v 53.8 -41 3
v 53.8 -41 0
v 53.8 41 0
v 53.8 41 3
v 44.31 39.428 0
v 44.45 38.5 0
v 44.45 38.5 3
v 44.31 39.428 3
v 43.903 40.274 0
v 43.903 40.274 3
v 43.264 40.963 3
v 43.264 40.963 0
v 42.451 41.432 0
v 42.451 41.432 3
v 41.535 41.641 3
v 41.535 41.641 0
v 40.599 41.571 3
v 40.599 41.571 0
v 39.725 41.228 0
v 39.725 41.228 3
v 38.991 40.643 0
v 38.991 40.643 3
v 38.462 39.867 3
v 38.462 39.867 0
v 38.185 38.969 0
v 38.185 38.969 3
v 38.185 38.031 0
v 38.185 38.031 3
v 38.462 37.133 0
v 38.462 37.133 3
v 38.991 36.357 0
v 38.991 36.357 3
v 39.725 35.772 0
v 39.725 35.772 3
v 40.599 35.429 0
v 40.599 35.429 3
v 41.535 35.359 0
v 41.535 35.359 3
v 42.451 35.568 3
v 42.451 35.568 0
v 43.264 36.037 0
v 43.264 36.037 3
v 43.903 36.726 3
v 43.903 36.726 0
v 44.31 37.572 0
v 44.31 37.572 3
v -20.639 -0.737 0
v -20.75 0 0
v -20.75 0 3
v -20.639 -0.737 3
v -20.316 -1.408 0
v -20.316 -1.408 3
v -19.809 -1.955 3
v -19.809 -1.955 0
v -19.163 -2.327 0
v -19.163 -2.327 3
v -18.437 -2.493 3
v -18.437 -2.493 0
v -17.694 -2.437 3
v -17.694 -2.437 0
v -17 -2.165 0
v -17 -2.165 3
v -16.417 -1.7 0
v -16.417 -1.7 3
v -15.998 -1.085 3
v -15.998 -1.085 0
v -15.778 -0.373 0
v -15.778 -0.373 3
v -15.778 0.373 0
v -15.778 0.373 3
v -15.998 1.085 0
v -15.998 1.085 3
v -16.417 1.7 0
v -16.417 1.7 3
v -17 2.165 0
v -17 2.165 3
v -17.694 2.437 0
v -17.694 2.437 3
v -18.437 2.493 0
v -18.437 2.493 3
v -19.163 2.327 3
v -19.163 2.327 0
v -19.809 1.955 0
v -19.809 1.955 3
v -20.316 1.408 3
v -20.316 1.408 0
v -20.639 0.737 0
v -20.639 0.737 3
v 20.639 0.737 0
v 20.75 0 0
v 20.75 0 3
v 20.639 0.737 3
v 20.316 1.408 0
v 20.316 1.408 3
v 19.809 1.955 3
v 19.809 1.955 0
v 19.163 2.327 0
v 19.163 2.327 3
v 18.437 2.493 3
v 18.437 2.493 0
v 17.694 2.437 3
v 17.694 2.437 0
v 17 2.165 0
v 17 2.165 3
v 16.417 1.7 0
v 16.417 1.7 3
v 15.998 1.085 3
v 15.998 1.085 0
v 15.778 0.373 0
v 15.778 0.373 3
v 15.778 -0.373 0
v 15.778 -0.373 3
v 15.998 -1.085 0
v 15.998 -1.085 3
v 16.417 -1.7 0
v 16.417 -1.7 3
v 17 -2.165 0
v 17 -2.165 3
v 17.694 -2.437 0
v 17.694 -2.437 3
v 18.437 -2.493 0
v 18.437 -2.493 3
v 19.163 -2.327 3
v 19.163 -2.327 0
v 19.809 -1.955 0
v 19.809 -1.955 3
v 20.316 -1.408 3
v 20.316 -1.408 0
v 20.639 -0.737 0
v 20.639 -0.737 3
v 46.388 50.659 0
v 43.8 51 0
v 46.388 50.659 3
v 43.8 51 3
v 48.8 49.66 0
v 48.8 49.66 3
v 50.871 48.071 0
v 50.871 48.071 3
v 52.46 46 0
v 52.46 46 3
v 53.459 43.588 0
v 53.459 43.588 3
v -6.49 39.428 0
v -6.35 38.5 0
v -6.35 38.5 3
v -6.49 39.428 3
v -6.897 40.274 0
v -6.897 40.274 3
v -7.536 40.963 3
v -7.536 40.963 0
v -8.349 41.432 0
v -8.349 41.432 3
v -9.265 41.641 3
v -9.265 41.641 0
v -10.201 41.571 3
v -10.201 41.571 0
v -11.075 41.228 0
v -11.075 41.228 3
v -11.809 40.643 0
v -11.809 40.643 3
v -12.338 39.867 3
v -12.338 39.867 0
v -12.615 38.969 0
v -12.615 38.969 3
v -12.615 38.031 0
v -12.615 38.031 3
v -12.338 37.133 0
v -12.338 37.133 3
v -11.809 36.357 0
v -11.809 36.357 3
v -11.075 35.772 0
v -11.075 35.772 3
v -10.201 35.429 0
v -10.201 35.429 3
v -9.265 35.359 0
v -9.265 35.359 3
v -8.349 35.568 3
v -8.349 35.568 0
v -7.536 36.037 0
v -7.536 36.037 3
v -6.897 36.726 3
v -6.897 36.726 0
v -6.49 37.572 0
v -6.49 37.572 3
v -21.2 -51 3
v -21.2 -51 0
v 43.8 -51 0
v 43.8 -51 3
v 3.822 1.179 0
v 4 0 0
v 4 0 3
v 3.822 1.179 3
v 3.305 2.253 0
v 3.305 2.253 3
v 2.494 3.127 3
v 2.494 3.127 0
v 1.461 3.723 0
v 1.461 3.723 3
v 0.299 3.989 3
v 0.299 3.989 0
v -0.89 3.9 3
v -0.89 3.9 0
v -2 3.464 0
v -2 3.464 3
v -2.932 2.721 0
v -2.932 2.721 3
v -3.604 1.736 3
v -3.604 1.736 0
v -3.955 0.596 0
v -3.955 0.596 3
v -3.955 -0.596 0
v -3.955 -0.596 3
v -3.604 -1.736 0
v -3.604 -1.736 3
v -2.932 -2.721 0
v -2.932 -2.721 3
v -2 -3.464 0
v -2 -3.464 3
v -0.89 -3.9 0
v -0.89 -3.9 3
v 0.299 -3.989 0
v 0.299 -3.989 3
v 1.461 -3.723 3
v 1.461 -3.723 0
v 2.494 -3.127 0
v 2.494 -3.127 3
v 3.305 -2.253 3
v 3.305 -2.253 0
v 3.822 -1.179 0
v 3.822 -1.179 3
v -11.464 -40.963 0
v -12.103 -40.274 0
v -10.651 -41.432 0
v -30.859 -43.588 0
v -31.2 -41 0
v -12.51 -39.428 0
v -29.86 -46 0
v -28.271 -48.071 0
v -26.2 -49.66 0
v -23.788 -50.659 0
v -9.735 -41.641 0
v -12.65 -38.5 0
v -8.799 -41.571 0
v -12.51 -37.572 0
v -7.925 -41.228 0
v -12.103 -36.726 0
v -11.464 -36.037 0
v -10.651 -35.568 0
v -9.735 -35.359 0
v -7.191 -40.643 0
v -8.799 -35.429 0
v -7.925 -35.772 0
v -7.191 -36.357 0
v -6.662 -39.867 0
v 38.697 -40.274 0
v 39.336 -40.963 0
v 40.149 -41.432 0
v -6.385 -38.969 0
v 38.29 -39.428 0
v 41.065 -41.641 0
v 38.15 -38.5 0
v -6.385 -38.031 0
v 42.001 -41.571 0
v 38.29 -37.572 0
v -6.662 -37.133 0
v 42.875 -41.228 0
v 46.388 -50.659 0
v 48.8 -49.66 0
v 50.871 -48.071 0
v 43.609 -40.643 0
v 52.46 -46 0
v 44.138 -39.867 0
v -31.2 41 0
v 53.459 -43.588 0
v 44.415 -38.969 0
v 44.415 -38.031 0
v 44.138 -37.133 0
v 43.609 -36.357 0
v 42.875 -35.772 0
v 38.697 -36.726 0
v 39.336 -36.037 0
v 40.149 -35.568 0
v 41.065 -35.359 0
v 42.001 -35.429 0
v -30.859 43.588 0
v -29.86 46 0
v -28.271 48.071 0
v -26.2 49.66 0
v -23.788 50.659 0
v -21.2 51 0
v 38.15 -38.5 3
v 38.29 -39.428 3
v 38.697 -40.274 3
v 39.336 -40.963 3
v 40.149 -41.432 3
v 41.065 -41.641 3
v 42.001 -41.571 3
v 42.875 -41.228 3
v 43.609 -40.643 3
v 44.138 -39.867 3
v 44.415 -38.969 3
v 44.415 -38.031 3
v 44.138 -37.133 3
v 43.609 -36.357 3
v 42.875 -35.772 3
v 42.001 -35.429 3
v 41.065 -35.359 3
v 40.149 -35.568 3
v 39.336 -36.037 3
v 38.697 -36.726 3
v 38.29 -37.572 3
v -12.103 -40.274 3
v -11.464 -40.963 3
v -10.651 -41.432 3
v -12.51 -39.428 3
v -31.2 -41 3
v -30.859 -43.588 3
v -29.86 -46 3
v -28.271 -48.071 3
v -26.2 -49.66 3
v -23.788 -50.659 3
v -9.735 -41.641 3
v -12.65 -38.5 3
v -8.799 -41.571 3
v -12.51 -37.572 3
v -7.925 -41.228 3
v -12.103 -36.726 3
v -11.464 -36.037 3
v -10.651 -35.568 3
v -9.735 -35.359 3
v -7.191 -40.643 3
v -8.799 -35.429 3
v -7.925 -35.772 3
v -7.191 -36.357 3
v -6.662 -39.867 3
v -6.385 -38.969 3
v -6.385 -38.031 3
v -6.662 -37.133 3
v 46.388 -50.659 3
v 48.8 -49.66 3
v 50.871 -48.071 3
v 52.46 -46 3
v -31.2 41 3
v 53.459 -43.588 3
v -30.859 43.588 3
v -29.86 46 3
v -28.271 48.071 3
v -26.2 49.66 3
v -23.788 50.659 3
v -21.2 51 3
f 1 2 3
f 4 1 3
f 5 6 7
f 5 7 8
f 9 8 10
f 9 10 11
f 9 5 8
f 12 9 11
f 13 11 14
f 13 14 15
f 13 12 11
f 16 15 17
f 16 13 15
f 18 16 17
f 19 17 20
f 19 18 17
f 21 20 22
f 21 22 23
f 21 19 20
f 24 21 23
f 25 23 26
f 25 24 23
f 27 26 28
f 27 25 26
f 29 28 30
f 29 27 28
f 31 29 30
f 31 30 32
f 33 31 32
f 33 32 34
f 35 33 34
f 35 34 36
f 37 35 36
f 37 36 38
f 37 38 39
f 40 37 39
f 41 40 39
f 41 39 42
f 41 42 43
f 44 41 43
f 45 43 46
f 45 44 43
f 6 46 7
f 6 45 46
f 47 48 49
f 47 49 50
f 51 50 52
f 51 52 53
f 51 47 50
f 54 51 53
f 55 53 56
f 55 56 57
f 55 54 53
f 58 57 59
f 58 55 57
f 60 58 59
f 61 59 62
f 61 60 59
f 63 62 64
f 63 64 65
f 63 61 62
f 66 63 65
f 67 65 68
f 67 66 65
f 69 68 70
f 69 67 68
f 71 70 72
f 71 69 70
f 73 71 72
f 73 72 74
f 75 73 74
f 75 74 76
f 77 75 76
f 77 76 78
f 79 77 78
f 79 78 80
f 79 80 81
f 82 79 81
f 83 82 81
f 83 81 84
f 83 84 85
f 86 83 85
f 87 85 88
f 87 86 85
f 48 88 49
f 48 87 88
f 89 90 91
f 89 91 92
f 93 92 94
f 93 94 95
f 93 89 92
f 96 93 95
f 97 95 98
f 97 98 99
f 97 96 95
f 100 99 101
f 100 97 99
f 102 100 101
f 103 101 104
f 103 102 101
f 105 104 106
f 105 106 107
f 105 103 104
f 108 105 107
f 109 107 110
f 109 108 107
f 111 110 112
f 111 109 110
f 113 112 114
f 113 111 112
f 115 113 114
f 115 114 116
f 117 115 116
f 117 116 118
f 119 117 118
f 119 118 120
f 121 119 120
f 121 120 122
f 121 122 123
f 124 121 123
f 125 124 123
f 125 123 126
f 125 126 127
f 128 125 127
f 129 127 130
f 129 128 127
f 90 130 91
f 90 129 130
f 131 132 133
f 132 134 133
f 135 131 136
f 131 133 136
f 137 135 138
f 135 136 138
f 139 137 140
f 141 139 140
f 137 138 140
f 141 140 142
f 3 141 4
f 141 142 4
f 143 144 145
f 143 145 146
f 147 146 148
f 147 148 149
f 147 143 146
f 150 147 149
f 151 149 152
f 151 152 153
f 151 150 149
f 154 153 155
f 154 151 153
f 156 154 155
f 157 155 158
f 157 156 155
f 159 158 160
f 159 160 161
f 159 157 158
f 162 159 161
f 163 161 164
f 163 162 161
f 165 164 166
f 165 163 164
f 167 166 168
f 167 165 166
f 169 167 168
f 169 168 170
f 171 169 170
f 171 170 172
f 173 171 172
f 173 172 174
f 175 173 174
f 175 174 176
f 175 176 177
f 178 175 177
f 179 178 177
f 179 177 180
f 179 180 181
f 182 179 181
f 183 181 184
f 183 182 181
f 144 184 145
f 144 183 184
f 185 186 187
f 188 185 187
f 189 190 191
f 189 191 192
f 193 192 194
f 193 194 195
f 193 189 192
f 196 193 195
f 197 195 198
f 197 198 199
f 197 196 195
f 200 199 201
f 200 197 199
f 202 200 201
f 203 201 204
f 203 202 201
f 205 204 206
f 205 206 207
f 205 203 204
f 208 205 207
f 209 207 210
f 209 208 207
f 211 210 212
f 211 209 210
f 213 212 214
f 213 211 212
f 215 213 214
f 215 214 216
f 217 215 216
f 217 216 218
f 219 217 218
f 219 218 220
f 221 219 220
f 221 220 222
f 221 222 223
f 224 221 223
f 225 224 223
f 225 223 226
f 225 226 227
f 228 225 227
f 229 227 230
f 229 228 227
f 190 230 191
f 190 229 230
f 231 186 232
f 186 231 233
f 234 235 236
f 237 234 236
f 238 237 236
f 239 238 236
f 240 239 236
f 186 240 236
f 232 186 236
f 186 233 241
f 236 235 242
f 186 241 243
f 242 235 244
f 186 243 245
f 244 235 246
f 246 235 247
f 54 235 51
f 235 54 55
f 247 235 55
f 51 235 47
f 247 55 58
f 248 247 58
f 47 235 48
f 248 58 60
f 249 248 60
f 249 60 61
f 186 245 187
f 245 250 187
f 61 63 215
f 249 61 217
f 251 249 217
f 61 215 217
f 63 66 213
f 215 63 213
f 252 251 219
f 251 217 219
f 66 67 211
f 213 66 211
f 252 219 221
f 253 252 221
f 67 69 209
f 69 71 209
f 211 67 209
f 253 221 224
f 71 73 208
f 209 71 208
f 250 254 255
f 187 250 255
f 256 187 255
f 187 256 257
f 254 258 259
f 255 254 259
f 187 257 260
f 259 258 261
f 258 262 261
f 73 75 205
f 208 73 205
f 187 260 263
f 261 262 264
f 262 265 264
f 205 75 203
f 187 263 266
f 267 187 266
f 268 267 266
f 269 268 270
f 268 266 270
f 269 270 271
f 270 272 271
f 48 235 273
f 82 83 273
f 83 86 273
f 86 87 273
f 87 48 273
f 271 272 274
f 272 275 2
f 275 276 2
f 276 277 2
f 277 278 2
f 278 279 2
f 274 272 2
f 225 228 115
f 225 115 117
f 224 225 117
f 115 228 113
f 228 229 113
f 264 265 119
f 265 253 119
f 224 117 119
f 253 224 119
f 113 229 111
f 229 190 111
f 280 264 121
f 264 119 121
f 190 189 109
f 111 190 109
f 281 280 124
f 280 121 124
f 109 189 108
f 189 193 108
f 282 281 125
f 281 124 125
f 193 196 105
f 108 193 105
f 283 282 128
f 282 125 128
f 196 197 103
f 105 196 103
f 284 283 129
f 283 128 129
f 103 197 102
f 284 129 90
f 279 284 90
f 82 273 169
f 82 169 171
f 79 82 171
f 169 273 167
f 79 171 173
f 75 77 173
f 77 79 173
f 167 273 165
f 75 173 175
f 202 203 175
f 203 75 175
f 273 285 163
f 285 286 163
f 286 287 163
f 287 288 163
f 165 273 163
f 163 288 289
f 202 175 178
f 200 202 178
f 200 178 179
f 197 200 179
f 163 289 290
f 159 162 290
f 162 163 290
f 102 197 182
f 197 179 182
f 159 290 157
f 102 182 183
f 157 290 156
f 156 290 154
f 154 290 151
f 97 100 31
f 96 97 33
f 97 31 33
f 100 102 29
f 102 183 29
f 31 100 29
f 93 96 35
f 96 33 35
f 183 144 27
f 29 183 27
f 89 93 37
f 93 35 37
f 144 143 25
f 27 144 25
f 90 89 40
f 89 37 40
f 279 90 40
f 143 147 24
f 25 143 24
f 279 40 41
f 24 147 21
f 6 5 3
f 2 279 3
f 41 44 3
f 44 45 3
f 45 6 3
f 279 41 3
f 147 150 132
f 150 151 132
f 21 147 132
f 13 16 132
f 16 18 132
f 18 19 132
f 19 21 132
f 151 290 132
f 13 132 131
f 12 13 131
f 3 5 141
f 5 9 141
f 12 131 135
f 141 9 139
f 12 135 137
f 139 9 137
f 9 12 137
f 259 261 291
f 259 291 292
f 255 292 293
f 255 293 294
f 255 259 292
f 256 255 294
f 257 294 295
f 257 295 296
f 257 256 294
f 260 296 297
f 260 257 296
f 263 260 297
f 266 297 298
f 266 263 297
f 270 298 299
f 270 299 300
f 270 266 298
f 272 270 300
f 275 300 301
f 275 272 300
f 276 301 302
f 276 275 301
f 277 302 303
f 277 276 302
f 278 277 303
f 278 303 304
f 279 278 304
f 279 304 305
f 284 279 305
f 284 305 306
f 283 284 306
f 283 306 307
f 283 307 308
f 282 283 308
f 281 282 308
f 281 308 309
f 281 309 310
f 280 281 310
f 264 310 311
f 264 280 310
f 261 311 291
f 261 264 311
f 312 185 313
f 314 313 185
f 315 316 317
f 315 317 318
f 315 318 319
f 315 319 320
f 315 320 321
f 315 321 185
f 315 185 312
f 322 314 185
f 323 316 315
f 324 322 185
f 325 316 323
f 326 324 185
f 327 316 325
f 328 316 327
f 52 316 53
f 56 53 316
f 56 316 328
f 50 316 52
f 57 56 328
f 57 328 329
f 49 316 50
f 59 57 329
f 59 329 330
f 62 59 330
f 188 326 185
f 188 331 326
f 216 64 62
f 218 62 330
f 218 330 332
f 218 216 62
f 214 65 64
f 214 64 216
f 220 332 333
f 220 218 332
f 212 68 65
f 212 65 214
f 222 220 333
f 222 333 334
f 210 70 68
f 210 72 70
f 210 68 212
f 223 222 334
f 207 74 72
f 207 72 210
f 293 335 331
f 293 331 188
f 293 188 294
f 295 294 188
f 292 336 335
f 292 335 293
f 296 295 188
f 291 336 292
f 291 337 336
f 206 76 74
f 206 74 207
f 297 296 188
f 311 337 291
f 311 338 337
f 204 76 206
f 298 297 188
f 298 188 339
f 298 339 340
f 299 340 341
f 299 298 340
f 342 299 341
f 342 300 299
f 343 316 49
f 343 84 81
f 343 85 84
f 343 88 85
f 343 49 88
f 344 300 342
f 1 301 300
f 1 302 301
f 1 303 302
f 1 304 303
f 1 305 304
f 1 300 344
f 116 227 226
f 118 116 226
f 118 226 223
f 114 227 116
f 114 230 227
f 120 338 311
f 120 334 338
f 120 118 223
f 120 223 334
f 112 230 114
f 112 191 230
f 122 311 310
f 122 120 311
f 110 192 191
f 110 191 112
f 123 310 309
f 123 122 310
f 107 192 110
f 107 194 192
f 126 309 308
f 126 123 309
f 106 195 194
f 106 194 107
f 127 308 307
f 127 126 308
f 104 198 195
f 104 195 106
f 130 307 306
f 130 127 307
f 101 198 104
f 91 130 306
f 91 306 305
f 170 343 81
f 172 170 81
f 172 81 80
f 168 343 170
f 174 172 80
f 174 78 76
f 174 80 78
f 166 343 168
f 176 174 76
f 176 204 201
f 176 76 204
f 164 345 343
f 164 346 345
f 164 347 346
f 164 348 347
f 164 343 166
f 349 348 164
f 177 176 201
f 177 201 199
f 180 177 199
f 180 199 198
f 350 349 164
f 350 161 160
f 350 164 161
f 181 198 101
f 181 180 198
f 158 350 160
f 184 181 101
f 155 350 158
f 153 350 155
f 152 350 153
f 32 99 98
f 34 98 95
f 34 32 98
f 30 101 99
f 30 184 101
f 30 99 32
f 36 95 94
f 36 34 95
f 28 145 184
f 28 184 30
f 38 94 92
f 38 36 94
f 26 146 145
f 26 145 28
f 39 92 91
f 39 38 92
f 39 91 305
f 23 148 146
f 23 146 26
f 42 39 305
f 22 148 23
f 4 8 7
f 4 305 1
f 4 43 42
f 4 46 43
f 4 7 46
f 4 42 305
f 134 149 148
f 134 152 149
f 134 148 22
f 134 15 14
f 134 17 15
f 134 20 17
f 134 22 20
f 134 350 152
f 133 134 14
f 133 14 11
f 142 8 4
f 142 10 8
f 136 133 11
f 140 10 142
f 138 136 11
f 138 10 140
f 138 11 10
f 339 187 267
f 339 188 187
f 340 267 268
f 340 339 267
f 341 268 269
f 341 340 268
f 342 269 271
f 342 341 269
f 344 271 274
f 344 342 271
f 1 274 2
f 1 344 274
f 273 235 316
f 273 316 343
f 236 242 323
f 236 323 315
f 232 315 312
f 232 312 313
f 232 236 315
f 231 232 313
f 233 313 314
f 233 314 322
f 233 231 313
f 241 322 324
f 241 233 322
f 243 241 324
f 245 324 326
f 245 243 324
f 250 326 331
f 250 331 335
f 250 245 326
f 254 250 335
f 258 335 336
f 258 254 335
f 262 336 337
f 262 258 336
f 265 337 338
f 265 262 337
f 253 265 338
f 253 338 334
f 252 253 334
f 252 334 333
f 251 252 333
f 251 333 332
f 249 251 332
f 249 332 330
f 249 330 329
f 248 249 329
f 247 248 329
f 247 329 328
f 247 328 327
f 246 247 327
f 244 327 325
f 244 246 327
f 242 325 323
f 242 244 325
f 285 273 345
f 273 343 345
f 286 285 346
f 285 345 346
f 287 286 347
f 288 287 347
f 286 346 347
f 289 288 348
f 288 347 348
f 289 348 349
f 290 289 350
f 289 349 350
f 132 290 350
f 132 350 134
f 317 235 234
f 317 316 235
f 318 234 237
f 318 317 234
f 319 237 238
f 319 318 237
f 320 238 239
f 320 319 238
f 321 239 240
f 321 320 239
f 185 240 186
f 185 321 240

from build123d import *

# Parameters (mm, degrees)
CROQUIS1_W              = 85
CROQUIS1_H              = 102
CROQUIS1_R              = 4
CROQUIS1_R_2            = 2.5
CROQUIS1_R_3            = 3.15
SALIENTE_EXTRUIR1_DEPTH = 3
REDONDEO1_R             = 10


with BuildPart() as part:
    # Croquis1 → Saliente-Extruir1 (new body)
    with BuildSketch(Plane.XY):
        with Locations((11.3, 0)):
            Rectangle(CROQUIS1_W, CROQUIS1_H)
        Circle(CROQUIS1_R, mode=Mode.SUBTRACT)
        with Locations((18.25, 0)):
            Circle(CROQUIS1_R_2, mode=Mode.SUBTRACT)
        with Locations(Location((-18.25, 0, 0), (0, 0, 180))):
            Circle(CROQUIS1_R_2, mode=Mode.SUBTRACT)
        with Locations((-9.5, 38.5)):
            Circle(CROQUIS1_R_3, mode=Mode.SUBTRACT)
        with Locations(Location((-9.5, -38.5, 0), (0, 0, 180))):
            Circle(CROQUIS1_R_3, mode=Mode.SUBTRACT)
        with Locations((41.3, 38.5)):
            Circle(CROQUIS1_R_3, mode=Mode.SUBTRACT)
        with Locations(Location((41.3, -38.5, 0), (0, 0, 180))):
            Circle(CROQUIS1_R_3, mode=Mode.SUBTRACT)
    extrude(amount=SALIENTE_EXTRUIR1_DEPTH)

    # Redondeo1
    redondeo1_edges = [part.edges().sort_by_distance(p)[0] for p in [
        (-31.2, 51, 1.5),
        (53.8, 51, 1.5),
        (53.8, -51, 1.5),
        (-31.2, -51, 1.5),
    ]]
    fillet(redondeo1_edges, radius=REDONDEO1_R)


solid = part.part
